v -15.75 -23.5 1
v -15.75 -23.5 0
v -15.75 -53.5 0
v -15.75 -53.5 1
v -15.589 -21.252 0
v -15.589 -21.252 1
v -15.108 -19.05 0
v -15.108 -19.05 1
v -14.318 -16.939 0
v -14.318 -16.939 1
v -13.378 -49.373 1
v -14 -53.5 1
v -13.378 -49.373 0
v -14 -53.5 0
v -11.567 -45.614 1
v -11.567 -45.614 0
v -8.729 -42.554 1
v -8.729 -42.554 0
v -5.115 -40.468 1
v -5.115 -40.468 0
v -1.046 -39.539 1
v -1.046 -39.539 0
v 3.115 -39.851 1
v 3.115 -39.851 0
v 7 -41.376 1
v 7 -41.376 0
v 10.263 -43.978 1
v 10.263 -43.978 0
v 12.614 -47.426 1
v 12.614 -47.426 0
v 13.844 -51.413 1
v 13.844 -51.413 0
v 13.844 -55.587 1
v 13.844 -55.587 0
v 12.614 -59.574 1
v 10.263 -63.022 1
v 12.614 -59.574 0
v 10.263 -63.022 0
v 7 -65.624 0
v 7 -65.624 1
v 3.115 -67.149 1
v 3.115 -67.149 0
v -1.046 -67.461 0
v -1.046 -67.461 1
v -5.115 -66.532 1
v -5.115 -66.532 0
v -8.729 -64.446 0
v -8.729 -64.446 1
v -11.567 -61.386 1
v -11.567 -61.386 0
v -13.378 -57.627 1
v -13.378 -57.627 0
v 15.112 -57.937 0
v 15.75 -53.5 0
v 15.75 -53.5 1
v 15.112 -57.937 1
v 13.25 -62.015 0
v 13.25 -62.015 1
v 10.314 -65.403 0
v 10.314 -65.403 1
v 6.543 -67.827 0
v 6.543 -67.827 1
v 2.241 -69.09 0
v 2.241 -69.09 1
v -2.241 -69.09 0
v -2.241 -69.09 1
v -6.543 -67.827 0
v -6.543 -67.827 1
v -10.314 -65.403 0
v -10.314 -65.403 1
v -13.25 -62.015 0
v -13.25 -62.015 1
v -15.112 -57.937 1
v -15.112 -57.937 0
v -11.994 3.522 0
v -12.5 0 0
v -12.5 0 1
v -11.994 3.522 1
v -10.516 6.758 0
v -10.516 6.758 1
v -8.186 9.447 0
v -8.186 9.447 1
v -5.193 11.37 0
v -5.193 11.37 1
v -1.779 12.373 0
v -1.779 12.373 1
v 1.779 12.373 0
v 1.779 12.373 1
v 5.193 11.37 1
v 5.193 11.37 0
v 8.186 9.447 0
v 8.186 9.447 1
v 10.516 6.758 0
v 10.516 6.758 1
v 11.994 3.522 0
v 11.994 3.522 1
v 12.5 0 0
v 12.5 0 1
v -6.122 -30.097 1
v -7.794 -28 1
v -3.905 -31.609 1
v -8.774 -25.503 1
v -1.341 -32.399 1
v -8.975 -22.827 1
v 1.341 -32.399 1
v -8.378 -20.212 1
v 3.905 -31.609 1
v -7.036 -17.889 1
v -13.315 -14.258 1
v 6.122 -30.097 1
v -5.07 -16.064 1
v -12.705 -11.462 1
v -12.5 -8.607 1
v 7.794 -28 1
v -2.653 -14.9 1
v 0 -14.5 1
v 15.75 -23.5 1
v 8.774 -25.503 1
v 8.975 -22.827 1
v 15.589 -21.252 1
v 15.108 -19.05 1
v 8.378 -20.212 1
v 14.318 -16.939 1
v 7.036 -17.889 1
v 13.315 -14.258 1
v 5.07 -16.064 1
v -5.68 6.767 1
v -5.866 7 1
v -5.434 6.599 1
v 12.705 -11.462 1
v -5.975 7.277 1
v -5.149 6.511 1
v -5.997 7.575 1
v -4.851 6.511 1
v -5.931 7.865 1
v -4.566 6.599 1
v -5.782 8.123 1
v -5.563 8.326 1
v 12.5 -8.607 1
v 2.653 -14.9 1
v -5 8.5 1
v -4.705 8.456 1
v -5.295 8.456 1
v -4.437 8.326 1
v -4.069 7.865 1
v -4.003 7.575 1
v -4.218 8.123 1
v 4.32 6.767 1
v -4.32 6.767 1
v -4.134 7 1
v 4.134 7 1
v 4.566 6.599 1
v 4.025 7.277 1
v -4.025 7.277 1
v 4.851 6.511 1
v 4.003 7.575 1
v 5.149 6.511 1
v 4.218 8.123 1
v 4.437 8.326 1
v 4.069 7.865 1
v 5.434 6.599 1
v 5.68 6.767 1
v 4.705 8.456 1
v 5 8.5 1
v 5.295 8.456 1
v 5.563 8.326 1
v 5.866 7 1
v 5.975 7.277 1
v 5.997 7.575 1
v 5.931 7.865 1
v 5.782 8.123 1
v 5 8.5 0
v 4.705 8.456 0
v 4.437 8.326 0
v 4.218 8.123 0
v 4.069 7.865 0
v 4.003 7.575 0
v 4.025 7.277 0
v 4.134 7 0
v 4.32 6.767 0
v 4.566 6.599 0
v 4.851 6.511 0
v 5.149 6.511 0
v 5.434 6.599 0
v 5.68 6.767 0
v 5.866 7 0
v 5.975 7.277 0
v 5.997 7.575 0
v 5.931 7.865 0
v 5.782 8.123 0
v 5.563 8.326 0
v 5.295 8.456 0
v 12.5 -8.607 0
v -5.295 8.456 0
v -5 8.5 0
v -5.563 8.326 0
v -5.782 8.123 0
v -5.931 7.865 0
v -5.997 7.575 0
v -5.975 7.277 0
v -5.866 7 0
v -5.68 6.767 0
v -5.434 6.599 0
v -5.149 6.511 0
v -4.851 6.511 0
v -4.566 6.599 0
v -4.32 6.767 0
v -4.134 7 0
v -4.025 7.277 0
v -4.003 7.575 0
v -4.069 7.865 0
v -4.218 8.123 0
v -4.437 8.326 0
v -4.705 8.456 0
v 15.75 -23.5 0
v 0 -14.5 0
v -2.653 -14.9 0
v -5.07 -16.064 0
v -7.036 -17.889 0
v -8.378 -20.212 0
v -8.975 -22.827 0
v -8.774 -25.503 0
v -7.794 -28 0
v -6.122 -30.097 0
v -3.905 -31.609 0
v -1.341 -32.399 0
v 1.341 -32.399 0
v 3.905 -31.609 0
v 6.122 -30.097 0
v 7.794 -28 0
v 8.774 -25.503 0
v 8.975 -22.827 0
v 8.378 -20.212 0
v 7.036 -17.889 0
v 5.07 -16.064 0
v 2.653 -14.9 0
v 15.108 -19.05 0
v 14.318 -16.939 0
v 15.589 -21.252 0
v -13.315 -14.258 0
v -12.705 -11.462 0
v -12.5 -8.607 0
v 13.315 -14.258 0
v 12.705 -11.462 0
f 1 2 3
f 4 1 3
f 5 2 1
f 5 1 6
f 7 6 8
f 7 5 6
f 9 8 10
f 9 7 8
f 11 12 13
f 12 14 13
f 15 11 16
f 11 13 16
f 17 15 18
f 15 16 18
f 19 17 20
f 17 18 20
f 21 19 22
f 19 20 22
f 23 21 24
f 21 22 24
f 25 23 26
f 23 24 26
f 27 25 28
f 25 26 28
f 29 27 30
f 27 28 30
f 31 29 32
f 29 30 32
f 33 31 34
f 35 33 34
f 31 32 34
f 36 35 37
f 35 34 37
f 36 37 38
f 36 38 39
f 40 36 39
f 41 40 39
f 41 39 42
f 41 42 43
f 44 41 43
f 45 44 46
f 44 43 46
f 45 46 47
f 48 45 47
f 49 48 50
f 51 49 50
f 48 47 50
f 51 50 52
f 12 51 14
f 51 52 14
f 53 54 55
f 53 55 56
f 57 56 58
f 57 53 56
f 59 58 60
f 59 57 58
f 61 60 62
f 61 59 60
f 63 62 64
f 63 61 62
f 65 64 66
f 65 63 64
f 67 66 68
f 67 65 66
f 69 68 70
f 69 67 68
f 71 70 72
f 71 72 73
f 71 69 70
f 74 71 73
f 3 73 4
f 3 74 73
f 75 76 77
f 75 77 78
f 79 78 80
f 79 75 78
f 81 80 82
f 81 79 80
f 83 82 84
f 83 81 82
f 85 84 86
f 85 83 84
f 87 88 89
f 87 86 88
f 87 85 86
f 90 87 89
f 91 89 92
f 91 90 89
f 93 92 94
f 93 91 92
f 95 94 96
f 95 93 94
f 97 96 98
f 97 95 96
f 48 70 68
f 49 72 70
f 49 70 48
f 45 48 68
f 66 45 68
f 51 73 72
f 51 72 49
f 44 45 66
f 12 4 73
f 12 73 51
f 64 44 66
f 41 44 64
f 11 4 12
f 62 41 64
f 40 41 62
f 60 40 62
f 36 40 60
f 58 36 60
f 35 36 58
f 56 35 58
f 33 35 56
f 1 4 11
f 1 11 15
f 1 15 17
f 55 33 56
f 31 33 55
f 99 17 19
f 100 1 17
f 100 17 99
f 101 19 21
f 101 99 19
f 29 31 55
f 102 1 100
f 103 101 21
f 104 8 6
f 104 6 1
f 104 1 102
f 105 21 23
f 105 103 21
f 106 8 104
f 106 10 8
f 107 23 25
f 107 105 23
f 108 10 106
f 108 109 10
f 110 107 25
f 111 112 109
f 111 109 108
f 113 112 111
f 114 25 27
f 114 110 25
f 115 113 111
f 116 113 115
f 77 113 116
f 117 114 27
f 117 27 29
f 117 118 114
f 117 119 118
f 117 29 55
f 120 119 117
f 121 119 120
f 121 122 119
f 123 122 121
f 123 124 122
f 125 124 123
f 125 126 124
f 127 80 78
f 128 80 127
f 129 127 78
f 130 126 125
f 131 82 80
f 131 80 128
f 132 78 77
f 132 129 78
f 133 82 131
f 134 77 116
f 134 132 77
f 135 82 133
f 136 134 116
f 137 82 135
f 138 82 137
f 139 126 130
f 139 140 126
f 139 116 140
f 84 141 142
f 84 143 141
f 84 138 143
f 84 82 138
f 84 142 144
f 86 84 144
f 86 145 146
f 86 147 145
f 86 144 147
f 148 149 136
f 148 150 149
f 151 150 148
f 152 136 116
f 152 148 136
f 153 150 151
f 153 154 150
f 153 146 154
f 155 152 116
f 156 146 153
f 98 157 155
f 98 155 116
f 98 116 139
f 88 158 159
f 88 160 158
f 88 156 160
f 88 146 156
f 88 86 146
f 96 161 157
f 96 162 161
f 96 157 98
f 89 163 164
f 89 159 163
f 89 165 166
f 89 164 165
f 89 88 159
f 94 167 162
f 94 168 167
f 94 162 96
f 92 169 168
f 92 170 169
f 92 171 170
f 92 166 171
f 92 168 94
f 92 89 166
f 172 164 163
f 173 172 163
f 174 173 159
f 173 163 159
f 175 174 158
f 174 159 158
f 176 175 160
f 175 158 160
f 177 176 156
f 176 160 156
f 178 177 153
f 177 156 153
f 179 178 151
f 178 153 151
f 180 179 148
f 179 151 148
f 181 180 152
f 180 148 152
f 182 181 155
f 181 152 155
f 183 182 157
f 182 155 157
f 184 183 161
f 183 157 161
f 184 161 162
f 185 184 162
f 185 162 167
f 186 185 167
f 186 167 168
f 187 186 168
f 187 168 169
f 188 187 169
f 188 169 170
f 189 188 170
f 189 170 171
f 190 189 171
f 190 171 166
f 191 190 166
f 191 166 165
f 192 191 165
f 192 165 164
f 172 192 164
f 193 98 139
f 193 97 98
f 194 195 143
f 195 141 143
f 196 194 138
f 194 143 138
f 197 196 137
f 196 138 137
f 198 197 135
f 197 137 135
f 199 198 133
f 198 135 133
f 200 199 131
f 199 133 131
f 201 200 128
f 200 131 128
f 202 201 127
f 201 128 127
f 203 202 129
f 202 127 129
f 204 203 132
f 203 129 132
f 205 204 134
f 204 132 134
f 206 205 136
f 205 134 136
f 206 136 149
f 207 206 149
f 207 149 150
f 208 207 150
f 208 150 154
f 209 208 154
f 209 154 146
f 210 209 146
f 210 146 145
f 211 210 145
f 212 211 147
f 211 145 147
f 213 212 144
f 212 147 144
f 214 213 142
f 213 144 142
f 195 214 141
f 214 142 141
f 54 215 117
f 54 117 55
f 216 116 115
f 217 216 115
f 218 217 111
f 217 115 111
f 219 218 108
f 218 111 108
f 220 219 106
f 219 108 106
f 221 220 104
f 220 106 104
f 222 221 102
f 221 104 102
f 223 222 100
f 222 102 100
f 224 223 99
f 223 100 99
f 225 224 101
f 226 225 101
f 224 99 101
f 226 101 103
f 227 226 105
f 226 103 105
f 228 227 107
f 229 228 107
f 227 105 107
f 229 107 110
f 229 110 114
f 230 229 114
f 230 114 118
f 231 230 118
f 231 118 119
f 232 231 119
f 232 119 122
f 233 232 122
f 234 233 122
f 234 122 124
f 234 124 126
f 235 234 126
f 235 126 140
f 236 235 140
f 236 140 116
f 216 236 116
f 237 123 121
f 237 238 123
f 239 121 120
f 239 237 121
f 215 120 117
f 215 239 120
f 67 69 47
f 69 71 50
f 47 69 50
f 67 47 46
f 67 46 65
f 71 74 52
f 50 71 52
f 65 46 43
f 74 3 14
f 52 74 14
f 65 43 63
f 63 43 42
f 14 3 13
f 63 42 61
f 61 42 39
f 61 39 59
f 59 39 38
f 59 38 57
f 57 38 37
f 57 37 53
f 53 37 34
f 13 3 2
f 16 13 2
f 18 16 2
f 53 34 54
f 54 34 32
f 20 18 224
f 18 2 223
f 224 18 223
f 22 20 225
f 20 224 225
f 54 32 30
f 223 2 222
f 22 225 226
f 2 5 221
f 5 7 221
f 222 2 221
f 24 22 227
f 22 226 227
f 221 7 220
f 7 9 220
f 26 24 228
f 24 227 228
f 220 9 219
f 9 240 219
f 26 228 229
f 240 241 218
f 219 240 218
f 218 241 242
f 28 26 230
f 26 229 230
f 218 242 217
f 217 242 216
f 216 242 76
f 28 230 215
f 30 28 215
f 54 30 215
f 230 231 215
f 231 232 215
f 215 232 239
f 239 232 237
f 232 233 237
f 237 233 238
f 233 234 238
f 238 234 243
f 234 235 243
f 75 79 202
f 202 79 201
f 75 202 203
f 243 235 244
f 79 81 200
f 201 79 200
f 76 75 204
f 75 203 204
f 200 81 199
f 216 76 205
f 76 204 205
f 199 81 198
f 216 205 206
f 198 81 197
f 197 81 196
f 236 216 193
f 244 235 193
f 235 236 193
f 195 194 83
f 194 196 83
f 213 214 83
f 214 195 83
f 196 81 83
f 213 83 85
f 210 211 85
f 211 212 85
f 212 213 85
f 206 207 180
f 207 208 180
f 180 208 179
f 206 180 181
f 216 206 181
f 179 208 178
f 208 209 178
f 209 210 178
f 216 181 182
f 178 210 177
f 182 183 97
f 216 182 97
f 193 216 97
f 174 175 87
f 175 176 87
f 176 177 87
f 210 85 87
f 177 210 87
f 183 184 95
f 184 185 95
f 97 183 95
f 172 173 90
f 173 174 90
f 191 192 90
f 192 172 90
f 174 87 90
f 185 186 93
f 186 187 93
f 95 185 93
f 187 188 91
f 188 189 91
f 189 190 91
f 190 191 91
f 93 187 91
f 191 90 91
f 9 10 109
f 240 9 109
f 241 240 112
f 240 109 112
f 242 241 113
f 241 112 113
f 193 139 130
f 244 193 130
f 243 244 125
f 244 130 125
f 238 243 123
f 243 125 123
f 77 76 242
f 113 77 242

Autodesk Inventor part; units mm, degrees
ref_plane "YZ Plane" through (0, 0, 0) normal (1, 0, 0) x (0, 1, 0)
ref_plane "XZ Plane" through (0, 0, 0) normal (0, 1, 0) x (-1, 0, 0)
ref_plane "XY Plane" through (0, 0, 0) normal (0, 0, 1) x (1, 0, 0)
sketch "スケッチ1" plane through (0, 0, 0) normal (0, 0, 1) x (1, 0, 0)
  circle A0 centre (0, 0) radius 12.5
  circle A1 centre (0, -23.5) radius 15.75
  line L0 (-12.5, 0) -> (-12.5, -13.9181)
  line L1 (12.5, 0) -> (12.5, -13.9181)
  line L2 (0, 0) -> (0, -50.4255)
  point P0 (-15.75, -23.4978)
  point P1 (0.01, 12.5)
  dimension "d0" = 25
  dimension "d1" = 31.5
  dimension "d2" = 23.5
  dimension "d49" = 0
  dimension "d50" = 0
extrude "押し出し2" add sketch "スケッチ1" along normal blind 1
sketch "スケッチ4" plane through (0, 0, 0) normal (0, 0, -1) x (-1, 0, 0)
  arc A0 (12.5, 0) -> (-12.5, 0) centre (0, 0) ccw projected
  point P0 (-5, 7.5)
  point P1 (5, 7.5)
  dimension "d29" = 10
  dimension "d30" = 5
  dimension "d31" = 7.5
  dimension "d32" = 7.5
hole "Hole3" at (5, 7.5, 0) at (-5, 7.5, 0) direction (0, 0, 1) diameter 2 depth 8 tip angle 118
sketch "スケッチ5" plane through (0, 0, 0) normal (0, 0, -1) x (-1, 0, 0)
  arc A0 (-12.5, -13.9181) -> (12.5, -13.9181) centre (0, -23.5) ccw projected
hole "Hole4" at (0, -23.5, 0) direction (0, 0, 1) diameter 18 end through all
sketch "スケッチ6" plane through (0, 0, 0) normal (0, 0, -1) x (-1, 0, 0)
  circle A0 centre (0, -23.5) radius 9 projected
  arc A1 (-12.5, -13.9181) -> (12.5, -13.9181) centre (0, -23.5) ccw projected
  line L0 (12.5, 0) -> (12.5, -13.9181) projected
  circle A2 centre (0, -53.5) radius 14
  circle A3 centre (0, -53.5) radius 15.75
  line L1 (-15.75, -23.5) -> (-15.75, -53.5)
  line L2 (15.75, -23.5) -> (15.75, -53.5)
  dimension "d51" = 28
  dimension "d52" = 30
  dimension "d53" = 31.5
extrude "押し出し3" add sketch "スケッチ6" against normal blind 1 contours A1 A3 L1 | A1 A3 | A1 L2 A3 picked at (15.0141, -54.7564)
fillet "フィレット2" radius 20 2 edges at (12.5, -13.9181, 0.5) (-12.5, -13.9181, 0.5)
equation "\"d32\" = d31"
properties part number "JointC3'cover2_2nd" material "アルミニウム 6061"
